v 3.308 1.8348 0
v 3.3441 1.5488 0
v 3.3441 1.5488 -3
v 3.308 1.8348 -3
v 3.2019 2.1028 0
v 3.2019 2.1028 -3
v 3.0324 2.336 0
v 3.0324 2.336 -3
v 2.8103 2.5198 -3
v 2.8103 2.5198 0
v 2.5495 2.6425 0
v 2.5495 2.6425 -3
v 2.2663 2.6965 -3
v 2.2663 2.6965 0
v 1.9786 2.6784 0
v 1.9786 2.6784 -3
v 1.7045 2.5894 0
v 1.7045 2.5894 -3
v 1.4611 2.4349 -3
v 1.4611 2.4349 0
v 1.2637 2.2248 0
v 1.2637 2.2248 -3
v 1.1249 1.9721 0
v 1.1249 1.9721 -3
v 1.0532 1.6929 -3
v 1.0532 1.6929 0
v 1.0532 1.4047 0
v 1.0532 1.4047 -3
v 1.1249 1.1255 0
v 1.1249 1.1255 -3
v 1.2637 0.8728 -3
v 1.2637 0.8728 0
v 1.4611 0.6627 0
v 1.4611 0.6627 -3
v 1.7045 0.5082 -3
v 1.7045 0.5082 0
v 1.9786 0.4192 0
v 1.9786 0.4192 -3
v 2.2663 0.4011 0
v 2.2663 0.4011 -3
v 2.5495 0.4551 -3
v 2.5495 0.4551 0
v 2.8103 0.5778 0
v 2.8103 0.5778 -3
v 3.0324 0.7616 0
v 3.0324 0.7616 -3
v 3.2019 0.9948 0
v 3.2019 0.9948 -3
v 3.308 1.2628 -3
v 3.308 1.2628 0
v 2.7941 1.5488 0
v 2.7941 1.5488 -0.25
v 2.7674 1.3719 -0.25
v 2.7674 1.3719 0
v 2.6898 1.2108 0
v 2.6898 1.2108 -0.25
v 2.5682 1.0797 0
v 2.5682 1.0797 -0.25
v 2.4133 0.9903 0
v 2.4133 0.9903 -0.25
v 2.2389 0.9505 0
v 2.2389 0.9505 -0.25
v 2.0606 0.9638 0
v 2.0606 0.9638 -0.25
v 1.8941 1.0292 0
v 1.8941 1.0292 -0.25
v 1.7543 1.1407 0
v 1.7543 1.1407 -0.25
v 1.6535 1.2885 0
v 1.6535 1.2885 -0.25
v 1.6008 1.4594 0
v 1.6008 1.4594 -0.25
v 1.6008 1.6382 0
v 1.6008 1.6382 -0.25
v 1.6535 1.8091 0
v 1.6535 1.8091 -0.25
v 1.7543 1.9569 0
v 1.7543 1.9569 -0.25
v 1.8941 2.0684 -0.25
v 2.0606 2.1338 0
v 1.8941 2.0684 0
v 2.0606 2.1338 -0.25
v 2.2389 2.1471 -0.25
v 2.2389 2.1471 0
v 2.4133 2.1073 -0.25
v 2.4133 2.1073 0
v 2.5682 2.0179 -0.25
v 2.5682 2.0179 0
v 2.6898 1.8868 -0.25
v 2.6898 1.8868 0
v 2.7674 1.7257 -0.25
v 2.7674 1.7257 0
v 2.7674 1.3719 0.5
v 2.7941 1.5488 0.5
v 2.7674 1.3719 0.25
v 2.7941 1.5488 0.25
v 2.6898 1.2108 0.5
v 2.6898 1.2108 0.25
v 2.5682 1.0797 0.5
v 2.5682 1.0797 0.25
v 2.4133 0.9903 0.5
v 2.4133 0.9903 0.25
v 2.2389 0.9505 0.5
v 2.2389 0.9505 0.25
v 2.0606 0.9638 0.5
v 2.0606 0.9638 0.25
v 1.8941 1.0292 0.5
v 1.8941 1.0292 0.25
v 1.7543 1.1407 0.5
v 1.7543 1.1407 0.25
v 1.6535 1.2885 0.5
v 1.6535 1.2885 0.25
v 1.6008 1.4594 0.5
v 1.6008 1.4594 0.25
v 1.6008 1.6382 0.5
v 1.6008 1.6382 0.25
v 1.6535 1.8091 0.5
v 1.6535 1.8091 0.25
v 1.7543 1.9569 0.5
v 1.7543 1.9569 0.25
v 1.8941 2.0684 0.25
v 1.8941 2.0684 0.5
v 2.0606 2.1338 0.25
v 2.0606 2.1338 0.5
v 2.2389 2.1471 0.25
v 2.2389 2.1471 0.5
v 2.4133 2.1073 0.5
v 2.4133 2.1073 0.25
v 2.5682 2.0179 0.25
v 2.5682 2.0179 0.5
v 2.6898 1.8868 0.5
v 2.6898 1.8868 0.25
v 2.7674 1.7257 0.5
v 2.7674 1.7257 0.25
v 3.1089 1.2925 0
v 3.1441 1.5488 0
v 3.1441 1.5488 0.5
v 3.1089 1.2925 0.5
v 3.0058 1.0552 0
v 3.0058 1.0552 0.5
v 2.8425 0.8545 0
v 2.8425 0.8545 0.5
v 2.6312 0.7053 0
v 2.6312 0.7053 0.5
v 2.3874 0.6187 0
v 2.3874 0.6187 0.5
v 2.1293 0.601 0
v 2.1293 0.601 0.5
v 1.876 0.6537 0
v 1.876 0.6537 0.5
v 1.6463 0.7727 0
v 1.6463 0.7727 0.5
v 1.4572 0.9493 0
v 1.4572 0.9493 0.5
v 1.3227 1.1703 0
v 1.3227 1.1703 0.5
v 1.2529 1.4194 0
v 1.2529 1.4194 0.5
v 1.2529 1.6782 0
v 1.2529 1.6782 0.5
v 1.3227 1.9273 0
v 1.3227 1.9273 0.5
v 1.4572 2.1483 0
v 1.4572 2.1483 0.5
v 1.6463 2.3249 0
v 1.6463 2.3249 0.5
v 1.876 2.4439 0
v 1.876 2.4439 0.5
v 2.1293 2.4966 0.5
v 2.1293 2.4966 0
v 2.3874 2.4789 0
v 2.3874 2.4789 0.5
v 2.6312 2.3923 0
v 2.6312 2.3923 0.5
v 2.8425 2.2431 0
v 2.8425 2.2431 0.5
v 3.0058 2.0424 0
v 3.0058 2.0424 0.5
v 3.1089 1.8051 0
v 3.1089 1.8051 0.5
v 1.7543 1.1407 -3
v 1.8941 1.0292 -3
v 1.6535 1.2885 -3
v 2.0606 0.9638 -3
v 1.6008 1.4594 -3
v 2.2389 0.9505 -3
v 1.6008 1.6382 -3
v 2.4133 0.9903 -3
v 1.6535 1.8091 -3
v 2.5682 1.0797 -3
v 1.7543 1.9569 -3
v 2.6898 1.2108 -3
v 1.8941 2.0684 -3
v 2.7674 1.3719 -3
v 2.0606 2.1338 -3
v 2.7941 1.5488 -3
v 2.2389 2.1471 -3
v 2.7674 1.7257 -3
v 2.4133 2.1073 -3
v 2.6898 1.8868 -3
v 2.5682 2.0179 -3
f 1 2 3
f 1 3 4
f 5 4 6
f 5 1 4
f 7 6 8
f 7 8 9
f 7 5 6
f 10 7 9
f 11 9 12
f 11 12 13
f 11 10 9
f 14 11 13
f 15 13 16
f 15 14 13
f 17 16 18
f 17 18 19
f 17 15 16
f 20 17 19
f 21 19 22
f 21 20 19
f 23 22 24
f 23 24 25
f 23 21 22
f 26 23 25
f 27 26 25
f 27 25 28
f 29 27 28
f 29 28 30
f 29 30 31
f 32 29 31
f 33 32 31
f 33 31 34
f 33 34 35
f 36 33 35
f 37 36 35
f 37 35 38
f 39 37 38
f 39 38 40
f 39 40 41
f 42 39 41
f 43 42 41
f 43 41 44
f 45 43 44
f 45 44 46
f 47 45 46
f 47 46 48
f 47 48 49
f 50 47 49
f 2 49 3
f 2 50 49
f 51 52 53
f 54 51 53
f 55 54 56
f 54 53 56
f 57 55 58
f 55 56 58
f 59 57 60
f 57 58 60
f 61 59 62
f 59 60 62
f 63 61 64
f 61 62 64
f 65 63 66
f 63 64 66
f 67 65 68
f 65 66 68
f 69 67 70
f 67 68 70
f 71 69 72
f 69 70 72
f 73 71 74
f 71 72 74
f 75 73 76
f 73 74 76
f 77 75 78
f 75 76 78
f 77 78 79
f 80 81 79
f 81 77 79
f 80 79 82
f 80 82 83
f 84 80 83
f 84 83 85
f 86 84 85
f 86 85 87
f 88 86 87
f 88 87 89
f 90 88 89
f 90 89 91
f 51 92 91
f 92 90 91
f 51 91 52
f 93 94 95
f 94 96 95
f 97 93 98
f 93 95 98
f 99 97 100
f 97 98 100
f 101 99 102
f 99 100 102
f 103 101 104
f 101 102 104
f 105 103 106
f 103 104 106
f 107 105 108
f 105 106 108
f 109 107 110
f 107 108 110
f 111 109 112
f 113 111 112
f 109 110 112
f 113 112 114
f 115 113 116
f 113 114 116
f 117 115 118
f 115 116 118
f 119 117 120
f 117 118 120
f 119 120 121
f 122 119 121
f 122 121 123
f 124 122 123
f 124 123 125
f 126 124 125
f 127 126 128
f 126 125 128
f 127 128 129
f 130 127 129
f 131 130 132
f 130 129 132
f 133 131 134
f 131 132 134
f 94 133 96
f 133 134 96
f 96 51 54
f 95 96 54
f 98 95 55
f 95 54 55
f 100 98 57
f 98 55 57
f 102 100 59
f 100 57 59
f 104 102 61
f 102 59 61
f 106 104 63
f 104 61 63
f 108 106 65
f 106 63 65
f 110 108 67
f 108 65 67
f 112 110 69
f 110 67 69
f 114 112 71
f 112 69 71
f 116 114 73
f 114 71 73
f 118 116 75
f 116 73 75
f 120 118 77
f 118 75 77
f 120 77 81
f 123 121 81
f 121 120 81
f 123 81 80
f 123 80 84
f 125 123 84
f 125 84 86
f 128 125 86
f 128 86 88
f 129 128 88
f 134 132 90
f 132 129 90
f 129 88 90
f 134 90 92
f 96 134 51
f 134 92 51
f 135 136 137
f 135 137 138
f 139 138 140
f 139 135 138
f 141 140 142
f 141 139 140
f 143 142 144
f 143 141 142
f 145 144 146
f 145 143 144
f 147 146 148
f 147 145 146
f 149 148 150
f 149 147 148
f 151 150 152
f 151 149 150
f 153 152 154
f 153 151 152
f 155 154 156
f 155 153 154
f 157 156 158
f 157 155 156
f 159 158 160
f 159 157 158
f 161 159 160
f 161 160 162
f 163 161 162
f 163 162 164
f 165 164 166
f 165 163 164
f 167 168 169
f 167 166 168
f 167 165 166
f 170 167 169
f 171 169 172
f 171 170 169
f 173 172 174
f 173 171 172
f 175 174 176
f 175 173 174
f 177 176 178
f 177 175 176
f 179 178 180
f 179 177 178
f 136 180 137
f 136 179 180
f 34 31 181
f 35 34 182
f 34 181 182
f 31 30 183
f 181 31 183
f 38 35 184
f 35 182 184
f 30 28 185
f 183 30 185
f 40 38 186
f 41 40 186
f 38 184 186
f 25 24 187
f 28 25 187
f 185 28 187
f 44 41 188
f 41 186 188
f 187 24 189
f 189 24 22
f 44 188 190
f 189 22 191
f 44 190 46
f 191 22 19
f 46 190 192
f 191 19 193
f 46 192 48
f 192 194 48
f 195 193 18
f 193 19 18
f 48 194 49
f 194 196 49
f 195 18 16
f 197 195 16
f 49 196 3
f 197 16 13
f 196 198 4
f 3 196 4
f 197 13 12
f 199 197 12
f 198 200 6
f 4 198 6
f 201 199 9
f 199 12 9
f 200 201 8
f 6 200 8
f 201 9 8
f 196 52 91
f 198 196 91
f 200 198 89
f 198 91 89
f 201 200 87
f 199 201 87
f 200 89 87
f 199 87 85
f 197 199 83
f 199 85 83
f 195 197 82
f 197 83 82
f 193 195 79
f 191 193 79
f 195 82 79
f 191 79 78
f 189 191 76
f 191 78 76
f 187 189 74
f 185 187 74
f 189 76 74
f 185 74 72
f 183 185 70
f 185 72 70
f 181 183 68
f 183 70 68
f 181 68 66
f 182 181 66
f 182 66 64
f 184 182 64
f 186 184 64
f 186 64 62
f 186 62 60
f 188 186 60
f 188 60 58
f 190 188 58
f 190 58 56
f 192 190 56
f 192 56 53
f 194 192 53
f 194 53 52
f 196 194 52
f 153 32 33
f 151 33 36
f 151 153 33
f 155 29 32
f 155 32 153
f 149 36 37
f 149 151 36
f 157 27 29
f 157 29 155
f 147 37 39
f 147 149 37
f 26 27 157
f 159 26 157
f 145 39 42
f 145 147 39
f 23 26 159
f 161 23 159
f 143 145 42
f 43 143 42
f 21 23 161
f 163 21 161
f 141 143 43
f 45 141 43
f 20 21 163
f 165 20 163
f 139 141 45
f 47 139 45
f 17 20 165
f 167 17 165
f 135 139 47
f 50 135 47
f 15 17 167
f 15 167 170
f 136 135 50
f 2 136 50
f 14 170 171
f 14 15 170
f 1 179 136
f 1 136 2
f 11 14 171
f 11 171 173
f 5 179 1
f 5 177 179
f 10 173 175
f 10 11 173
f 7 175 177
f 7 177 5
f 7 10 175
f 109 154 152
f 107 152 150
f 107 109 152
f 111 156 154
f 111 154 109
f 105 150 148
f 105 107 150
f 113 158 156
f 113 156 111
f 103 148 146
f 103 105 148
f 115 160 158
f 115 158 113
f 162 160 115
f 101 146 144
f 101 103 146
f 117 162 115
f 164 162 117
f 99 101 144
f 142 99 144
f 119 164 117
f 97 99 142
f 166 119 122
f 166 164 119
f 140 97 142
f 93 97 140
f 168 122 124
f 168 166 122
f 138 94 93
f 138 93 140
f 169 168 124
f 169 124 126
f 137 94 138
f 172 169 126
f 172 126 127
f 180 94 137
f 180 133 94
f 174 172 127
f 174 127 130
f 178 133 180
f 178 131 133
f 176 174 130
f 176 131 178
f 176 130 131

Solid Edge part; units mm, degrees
sketch "Sketch1" plane through (0, 0, 0) normal (0, 0, 1) x (1, 0, 0)
  circle A0 centre (2.1941, 1.5488) radius 1.15
extrude "Protrusion1" add sketch "Sketch1" against normal blind 3
sketch "Sketch2" plane through (0, 0, 0) normal (0, 0, 1) x (1, 0, 0)
  circle A0 centre (2.1941, 1.5488) radius 0.95
extrude "ExtrudedProtrusion_2" add sketch "Sketch2" along normal blind 0.5
sketch "Sketch3" plane through (0, 0, 0) normal (0, 0, 1) x (1, 0, 0)
  circle A0 centre (2.1941, 1.5488) radius 0.6
extrude "ExtrudedCutout_1" cut sketch "Sketch3" along normal mid plane 0.5
sketch "Sketch4" plane through (0, 0, 0) normal (0, 0, 1) x (1, 0, 0)
  circle A0 centre (2.1941, 1.5488) radius 0.6
extrude "ExtrudedCutout_2" cut sketch "Sketch4" along normal blind 2.5 and the other way blind 6
